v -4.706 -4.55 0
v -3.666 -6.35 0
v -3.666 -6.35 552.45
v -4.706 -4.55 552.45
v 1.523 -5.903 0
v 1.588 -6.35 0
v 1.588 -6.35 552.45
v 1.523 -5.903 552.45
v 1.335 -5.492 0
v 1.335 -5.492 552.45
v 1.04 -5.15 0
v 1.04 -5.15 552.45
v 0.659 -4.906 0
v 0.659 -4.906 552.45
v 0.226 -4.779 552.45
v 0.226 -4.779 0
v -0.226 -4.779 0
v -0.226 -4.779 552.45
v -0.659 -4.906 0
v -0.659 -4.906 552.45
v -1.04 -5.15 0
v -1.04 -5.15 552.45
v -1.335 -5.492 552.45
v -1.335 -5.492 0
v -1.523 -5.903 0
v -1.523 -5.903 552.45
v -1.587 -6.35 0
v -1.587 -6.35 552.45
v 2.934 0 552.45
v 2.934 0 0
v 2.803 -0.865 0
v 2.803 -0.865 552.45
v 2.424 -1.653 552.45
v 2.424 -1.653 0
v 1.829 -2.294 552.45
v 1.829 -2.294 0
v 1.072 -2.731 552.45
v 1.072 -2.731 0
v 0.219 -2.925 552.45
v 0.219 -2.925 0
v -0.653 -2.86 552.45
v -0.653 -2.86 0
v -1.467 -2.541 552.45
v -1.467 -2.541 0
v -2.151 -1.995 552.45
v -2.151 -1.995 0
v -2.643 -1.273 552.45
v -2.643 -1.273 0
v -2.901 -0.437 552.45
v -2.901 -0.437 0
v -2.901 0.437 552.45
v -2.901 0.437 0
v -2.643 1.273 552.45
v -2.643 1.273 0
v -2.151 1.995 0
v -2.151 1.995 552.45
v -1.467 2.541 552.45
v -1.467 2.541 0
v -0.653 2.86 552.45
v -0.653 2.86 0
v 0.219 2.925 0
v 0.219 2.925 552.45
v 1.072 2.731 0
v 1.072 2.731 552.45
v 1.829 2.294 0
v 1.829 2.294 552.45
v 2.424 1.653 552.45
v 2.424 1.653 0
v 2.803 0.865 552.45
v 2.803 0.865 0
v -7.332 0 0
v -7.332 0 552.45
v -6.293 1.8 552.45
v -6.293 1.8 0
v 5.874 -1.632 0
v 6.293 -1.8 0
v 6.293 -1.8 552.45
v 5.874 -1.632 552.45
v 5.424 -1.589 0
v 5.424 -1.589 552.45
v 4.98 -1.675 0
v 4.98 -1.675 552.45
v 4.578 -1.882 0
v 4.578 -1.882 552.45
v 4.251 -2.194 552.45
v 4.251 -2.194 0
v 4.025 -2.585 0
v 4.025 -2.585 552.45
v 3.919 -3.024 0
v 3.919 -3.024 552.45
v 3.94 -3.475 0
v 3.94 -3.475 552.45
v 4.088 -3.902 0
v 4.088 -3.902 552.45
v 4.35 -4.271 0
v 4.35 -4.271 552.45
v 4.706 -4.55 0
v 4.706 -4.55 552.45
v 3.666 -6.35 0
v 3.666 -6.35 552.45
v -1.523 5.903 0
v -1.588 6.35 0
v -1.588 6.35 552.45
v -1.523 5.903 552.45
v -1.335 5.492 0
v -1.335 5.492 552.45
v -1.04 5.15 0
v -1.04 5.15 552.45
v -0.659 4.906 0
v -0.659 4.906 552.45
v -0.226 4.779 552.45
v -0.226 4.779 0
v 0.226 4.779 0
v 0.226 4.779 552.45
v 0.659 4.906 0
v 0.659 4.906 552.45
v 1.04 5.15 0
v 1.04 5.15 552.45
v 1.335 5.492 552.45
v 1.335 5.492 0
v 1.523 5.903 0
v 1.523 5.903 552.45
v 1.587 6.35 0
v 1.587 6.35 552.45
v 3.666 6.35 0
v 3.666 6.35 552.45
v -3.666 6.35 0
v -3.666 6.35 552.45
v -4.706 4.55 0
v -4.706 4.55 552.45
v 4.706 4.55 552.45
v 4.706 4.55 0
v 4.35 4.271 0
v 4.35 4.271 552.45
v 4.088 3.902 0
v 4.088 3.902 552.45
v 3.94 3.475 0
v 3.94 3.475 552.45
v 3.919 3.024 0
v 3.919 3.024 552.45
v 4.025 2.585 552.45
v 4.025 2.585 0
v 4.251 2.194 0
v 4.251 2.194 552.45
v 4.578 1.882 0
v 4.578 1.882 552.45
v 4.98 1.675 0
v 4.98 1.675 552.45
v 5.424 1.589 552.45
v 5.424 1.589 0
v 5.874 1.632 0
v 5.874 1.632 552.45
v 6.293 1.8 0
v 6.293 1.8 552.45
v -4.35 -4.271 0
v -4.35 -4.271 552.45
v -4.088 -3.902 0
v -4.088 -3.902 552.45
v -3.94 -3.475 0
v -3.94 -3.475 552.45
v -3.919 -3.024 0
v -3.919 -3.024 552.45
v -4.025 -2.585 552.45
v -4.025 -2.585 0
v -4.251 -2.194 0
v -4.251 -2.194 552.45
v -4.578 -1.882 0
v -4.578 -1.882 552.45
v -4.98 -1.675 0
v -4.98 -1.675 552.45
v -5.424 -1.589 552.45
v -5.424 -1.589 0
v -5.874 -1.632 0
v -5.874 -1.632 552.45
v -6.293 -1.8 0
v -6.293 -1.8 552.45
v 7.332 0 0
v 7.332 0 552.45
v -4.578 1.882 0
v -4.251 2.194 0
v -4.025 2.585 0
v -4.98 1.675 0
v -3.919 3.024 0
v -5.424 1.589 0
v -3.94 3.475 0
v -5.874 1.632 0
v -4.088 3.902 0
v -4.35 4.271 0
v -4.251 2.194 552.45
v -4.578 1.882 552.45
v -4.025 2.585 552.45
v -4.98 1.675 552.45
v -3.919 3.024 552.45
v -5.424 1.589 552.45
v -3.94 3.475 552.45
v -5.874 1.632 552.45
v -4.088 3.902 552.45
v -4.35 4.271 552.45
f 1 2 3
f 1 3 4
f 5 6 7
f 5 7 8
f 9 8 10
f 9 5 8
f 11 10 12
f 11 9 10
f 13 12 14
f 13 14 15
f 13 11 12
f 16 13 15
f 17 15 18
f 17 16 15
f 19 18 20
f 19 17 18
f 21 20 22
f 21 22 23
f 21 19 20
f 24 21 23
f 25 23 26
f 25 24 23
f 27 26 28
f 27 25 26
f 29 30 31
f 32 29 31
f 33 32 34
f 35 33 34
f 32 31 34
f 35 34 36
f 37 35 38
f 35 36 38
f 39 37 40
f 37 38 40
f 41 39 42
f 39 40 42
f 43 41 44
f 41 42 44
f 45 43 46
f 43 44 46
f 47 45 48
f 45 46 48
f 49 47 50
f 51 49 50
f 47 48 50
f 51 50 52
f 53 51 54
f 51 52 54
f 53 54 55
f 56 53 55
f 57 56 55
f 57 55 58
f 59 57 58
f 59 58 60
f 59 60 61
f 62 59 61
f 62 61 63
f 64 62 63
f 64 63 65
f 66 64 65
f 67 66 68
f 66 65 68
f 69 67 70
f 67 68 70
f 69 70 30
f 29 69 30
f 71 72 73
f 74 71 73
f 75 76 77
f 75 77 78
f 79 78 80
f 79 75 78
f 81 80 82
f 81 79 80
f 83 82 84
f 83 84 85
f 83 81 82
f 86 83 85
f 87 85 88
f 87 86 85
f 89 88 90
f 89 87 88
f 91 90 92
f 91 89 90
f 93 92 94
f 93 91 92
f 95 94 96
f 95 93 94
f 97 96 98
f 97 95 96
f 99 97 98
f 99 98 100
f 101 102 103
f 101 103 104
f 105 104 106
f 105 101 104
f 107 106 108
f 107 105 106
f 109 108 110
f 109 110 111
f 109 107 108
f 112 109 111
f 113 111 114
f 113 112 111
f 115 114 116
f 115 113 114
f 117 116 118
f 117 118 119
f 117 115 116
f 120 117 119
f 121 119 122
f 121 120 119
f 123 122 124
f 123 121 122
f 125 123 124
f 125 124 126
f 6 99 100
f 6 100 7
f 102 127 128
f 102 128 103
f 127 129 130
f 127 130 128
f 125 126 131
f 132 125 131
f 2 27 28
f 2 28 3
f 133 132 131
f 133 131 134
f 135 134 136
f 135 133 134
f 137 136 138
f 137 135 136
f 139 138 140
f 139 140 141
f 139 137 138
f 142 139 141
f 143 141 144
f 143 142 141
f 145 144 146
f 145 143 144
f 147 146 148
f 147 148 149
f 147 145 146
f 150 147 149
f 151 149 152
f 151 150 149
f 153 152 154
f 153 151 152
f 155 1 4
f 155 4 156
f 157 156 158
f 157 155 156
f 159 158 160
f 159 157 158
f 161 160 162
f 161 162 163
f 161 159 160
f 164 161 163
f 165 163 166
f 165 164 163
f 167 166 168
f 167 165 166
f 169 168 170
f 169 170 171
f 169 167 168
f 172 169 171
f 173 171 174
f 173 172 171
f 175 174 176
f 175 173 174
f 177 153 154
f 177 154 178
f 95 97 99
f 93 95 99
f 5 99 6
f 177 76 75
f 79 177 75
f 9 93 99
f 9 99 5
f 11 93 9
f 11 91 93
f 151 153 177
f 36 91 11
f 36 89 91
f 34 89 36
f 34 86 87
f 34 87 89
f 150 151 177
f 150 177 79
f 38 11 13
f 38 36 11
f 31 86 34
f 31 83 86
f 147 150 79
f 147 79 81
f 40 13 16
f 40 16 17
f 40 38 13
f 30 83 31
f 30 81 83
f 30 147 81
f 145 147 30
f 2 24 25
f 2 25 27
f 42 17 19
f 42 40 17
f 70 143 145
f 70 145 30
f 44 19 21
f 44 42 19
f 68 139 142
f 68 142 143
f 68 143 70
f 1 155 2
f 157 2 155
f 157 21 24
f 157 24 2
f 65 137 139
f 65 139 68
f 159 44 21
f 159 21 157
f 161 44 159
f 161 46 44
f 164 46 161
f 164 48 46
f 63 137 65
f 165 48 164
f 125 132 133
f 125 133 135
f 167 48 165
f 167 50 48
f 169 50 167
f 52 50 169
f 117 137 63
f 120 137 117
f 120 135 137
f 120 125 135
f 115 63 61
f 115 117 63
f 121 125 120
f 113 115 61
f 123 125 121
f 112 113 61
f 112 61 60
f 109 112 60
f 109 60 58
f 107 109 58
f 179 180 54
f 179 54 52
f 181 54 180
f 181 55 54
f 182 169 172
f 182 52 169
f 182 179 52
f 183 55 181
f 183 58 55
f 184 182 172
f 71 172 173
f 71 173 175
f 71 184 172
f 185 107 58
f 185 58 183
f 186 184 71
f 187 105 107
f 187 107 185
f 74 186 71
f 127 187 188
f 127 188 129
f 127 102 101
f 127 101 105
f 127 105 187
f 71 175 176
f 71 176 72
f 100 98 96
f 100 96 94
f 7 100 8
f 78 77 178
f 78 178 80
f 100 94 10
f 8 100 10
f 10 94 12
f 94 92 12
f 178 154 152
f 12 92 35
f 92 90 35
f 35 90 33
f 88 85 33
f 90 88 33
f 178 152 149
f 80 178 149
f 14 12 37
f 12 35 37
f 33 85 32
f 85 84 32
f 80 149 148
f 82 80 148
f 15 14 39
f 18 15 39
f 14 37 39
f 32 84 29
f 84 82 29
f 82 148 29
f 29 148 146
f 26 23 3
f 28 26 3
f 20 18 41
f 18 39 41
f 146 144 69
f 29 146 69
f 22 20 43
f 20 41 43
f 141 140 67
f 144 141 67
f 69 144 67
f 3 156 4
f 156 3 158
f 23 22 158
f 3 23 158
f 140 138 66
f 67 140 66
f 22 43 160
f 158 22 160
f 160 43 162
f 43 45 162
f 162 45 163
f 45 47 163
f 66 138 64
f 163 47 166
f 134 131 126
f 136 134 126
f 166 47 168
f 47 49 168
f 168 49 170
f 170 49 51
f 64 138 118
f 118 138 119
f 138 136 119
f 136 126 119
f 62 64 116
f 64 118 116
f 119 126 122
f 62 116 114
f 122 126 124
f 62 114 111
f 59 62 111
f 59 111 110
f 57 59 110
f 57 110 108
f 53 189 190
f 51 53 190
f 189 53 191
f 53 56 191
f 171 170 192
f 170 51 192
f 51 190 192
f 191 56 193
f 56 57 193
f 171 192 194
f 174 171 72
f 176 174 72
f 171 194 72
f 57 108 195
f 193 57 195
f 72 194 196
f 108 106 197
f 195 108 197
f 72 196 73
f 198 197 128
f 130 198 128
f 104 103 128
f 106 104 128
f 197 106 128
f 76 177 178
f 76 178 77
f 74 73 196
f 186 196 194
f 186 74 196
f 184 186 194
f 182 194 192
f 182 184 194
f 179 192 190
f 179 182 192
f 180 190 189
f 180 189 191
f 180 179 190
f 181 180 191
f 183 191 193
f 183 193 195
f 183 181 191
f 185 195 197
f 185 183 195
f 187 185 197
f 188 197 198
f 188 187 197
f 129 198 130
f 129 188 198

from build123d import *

# Parameters (mm, degrees)
SKETCH1_R           = 2.9337
BOSS_EXTRUDE1_DEPTH = 552.45


with BuildPart() as part:
    # Sketch1 → Boss-Extrude1 (new body)
    with BuildSketch(Plane(origin=(0, 0, 0), x_dir=(-1, 0, 0), z_dir=(0, 0, -1))):
        with BuildLine():
            Line((-4.70551159, -4.549815043), (-3.666174521, -6.349999904))
            Line((-3.666174521, -6.349999904), (-1.587500385, -6.349999904))
            ThreePointArc((-1.587500385, -6.349999904), (-3.85e-07, -4.762499904), (1.587499615, -6.349999904))
            Line((1.587499615, -6.349999904), (3.666173825, -6.349999904))
            Line((3.666173825, -6.349999904), (4.705510942, -4.54981524))
            ThreePointArc((4.705510942, -4.54981524), (4.124445629, -2.381249907), (6.293010962, -1.800184594))
            Line((6.293010962, -1.800184594), (7.332348079, 7e-08))
            Line((7.332348079, 7e-08), (6.293011217, 1.800184685))
            ThreePointArc((6.293011217, 1.800184685), (4.124445939, 2.381250203), (4.705511457, 4.549815481))
            Line((4.705511457, 4.549815481), (3.666174521, 6.350000222))
            Line((3.666174521, 6.350000222), (1.587500385, 6.350000222))
            ThreePointArc((1.587500385, 6.350000222), (3.85e-07, 4.762500222), (-1.587499615, 6.350000222))
            Line((-1.587499615, 6.350000222), (-3.666173825, 6.350000222))
            Line((-3.666173825, 6.350000222), (-4.705511038, 4.549815614))
            ThreePointArc((-4.705511038, 4.549815614), (-4.124445841, 2.38125025), (-6.293011205, 1.800185053))
            Line((-6.293011205, 1.800185053), (-7.332348419, 4.44e-07))
            Line((-7.332348419, 4.44e-07), (-6.293011423, -1.80018429))
            ThreePointArc((-6.293011423, -1.80018429), (-4.12444613, -2.38124975), (-4.70551159, -4.549815043))
        make_face()
        with Locations(Location((0, 0, 0), (0, 0, 180))):
            Circle(SKETCH1_R, mode=Mode.SUBTRACT)
    extrude(amount=-BOSS_EXTRUDE1_DEPTH)


solid = part.part
